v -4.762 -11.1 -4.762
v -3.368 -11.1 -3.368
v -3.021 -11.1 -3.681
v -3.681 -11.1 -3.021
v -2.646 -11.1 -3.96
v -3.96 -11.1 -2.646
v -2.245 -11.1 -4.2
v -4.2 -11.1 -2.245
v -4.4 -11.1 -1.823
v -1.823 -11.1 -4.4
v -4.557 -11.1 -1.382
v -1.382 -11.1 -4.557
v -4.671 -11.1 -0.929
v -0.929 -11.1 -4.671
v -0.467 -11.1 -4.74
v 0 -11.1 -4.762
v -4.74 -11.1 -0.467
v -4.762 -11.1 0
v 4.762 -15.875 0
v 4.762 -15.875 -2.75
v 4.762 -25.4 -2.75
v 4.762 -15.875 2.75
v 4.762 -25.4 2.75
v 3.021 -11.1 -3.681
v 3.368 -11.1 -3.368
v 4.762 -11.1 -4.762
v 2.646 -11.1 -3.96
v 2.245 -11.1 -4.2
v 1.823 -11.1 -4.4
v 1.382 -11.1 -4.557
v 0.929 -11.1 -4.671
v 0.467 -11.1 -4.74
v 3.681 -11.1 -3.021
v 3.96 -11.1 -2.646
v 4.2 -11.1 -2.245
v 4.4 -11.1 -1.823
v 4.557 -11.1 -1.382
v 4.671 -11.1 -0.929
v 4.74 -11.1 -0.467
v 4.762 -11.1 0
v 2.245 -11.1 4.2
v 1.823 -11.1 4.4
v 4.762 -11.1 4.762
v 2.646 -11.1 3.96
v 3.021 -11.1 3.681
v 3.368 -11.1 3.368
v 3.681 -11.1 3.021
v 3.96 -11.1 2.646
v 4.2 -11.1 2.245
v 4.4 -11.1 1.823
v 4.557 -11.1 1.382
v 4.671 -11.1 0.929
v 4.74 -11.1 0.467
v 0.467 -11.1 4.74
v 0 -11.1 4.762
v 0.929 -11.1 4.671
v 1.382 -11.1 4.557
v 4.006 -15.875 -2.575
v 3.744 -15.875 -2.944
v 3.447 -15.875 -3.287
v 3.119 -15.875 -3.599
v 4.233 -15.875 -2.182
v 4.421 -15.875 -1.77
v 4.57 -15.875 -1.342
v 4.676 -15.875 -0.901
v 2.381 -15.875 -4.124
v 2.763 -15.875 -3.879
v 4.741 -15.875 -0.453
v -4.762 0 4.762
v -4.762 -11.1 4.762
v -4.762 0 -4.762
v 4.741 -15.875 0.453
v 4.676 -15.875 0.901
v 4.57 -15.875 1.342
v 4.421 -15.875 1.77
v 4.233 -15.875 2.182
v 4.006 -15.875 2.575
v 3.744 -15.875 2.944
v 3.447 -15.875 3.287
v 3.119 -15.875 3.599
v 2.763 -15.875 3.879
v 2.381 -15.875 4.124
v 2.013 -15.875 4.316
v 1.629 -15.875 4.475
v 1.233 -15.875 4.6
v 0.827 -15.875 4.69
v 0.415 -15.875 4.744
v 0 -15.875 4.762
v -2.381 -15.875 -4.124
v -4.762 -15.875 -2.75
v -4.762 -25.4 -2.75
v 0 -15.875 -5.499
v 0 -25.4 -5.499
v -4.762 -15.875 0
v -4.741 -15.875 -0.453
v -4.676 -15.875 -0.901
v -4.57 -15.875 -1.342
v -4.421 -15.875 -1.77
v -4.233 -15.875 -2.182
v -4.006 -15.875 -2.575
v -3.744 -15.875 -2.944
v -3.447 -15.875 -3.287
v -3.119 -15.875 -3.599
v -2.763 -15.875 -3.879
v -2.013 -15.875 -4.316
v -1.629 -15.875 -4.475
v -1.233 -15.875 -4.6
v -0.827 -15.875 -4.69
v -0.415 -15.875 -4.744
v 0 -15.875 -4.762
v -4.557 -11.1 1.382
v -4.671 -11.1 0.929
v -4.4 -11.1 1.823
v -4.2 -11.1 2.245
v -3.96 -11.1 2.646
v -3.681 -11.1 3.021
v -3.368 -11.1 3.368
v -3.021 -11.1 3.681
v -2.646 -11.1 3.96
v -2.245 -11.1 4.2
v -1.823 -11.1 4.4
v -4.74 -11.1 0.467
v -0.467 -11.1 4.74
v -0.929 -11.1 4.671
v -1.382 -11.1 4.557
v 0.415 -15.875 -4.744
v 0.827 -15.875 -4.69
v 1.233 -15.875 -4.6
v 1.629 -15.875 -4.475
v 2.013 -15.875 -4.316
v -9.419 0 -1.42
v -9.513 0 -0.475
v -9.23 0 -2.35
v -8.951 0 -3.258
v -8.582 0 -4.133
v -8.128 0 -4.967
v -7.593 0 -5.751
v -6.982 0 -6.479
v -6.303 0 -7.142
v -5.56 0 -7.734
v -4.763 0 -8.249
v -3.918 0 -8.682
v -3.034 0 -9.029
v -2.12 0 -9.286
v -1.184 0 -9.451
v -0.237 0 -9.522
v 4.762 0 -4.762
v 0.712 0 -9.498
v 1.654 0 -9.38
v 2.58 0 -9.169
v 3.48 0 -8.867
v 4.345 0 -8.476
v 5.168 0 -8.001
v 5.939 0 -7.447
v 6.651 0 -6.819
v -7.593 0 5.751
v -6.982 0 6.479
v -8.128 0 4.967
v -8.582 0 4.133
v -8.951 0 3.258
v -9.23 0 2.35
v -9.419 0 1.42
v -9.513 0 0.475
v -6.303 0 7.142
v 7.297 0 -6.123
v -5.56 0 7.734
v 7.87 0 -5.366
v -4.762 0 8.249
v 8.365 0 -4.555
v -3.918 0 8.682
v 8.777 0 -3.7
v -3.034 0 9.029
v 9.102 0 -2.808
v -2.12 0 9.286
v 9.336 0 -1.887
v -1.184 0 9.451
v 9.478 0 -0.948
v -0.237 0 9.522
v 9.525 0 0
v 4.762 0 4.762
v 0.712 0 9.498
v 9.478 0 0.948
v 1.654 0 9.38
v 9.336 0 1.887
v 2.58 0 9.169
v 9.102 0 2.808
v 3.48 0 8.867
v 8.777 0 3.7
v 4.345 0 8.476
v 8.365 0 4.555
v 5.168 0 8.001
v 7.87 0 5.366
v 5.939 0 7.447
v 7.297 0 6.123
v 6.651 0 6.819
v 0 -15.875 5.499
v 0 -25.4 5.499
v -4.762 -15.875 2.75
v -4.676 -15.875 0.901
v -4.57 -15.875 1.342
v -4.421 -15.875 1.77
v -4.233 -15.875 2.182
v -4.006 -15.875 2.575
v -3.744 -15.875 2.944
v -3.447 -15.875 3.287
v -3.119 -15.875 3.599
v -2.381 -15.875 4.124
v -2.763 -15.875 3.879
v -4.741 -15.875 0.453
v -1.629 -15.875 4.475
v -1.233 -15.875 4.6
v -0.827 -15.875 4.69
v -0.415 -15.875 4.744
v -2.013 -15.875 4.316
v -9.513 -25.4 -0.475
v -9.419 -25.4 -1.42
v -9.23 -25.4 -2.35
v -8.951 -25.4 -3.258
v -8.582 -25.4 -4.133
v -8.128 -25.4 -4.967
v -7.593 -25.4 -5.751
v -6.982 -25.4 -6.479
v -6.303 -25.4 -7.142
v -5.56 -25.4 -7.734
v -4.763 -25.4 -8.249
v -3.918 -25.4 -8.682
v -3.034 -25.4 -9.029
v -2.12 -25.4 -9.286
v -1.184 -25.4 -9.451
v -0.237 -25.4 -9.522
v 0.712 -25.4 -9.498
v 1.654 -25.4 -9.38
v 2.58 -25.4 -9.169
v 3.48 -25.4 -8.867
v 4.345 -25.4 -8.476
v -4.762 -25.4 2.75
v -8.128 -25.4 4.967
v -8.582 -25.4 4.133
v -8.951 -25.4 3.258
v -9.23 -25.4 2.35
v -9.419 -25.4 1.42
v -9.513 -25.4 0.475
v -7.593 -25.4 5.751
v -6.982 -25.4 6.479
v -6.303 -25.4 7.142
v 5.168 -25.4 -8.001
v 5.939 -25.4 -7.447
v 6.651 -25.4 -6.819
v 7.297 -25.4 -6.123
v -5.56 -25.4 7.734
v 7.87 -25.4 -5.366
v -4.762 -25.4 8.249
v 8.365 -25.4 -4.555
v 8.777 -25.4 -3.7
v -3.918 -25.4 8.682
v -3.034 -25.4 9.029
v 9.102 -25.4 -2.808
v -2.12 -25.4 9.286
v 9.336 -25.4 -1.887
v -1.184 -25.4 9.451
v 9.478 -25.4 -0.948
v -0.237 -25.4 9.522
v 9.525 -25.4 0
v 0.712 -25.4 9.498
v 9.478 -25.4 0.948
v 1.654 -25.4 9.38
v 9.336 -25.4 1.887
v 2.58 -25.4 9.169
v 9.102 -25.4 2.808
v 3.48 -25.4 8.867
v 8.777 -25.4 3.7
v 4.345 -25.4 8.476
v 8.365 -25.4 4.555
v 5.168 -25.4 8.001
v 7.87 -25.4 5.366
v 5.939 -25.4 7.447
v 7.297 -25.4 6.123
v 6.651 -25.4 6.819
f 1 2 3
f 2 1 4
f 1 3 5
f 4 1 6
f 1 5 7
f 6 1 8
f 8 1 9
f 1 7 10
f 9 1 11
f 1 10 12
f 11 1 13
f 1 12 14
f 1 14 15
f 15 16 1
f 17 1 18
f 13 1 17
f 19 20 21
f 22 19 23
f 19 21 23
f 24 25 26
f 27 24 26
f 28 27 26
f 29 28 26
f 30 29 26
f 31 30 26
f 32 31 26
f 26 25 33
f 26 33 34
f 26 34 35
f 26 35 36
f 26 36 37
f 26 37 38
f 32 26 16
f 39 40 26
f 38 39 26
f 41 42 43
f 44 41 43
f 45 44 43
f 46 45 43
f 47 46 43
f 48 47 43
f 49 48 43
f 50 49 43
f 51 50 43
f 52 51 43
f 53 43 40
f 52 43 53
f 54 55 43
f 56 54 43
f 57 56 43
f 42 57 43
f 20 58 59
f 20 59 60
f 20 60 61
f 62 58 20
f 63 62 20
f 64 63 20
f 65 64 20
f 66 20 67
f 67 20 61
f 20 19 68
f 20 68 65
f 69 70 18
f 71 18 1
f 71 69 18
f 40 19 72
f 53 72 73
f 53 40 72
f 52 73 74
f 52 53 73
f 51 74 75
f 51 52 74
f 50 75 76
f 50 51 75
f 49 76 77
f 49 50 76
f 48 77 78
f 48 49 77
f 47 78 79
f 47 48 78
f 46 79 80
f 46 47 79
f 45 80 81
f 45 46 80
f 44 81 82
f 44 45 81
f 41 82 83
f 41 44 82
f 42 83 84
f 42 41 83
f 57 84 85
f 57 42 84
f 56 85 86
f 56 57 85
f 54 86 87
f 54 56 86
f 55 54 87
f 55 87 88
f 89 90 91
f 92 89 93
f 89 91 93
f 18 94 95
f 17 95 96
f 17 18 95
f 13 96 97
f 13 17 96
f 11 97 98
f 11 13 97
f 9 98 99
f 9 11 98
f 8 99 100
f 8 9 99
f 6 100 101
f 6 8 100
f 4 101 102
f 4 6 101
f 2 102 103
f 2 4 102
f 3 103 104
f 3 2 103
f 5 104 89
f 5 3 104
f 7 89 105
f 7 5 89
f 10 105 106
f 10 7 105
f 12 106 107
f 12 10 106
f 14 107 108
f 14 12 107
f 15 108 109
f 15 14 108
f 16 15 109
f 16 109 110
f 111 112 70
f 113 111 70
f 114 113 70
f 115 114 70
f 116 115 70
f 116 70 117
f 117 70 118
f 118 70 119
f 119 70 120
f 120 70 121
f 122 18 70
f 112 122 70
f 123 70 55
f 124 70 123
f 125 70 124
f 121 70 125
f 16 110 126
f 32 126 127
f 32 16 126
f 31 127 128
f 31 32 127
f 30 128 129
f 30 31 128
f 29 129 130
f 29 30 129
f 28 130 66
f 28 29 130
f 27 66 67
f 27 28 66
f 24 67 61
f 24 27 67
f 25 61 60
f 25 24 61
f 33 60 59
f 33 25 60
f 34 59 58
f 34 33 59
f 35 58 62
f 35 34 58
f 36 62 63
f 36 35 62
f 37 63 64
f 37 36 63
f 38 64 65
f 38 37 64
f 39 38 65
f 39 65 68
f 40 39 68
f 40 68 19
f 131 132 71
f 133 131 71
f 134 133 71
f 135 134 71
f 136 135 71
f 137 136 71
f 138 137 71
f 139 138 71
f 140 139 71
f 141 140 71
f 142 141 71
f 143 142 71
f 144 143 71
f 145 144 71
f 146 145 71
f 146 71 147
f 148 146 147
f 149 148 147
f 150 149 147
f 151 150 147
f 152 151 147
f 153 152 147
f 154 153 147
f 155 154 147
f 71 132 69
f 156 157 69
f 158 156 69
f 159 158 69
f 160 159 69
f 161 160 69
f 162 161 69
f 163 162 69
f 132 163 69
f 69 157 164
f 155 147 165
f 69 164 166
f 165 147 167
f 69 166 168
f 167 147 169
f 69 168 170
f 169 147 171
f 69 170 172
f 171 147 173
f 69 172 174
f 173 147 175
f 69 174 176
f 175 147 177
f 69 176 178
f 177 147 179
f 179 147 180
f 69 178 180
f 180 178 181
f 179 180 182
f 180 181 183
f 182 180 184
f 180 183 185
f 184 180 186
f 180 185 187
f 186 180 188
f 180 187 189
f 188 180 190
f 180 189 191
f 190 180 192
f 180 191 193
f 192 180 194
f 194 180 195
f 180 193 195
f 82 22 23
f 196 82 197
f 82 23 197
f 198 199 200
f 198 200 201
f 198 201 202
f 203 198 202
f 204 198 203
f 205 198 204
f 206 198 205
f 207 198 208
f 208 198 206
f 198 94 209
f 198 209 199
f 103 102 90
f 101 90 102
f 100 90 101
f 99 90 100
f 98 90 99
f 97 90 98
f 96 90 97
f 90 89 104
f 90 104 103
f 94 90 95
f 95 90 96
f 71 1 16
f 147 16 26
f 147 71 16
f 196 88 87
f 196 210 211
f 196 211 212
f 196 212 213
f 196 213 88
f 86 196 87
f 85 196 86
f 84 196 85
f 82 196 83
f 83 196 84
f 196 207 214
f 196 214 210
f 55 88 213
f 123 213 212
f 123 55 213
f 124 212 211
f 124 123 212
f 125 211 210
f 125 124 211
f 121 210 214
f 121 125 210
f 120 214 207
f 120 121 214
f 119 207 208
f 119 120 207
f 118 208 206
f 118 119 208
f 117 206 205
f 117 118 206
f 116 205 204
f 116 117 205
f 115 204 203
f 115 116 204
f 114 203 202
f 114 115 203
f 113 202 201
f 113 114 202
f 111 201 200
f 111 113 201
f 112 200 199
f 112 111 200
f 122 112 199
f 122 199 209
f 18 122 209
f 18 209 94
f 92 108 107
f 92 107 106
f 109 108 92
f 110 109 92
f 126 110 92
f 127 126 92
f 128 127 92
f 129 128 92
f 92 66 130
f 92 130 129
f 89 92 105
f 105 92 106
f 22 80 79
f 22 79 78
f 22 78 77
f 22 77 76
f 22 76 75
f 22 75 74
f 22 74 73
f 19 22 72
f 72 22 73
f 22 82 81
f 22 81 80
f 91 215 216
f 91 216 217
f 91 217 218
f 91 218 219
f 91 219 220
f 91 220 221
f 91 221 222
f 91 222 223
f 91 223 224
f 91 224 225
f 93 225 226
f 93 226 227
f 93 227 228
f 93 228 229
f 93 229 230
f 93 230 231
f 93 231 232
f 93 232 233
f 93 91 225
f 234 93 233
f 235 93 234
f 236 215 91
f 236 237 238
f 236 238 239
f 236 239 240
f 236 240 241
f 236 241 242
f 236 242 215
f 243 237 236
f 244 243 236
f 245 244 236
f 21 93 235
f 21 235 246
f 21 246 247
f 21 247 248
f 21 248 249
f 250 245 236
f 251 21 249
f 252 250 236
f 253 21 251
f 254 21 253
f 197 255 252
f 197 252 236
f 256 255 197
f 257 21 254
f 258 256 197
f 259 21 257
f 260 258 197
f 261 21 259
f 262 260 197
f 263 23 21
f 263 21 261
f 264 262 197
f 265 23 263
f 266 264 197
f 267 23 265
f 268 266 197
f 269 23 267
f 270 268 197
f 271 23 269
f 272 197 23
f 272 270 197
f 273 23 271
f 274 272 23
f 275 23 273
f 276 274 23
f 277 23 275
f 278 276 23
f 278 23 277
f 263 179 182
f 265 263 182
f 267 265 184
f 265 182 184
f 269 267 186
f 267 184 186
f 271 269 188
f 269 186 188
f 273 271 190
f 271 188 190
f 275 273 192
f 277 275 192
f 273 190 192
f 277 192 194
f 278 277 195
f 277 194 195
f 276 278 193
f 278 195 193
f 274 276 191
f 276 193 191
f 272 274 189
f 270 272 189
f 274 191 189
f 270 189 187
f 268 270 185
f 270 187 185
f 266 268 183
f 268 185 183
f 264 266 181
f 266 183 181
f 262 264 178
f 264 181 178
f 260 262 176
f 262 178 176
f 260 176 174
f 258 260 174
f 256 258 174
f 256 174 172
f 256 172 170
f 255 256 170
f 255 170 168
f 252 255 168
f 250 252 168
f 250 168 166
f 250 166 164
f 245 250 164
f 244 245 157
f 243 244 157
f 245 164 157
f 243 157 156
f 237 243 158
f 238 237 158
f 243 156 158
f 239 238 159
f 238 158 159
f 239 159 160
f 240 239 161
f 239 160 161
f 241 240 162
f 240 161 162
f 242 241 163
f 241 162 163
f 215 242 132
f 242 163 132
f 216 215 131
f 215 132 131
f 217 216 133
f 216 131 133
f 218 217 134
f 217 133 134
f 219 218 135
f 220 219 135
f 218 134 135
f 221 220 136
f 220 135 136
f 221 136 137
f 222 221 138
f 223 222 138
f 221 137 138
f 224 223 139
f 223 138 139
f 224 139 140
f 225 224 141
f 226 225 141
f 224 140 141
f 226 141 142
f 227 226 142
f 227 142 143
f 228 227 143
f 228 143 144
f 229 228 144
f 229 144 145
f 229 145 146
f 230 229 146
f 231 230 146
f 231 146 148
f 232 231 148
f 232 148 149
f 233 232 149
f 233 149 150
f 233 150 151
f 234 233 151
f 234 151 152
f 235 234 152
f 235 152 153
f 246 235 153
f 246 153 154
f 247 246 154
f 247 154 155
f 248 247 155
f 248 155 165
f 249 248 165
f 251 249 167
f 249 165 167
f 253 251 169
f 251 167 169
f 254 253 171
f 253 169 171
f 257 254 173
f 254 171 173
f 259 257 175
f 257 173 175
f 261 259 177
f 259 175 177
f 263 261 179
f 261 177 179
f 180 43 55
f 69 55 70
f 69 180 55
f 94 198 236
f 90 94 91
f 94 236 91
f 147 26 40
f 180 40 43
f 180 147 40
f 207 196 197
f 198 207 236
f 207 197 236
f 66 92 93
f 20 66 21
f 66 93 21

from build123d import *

# Parameters (mm, degrees)
F0_R     = 9.525
F1_DEPTH = 25.4
F3_DEPTH = 25.401
F4_DEPTH = 11.0998
F6_DEPTH = 9.525


with BuildPart() as f1:
    # F0 (on Front) → F1 (new body)
    with BuildSketch(Plane.XZ):
        Circle(F0_R)
    extrude(amount=F1_DEPTH)

    # F2 (on Front) → F3 (cut, through all)
    with BuildSketch(Plane.XZ):
        with BuildLine():
            ThreePointArc((-4.7625, 0), (-3.367596, -3.367596), (0, -4.7625))
            ThreePointArc((0, -4.7625), (3.367596, -3.367596), (4.7625, 0))
            ThreePointArc((4.7625, 0), (3.367596, 3.367596), (0, 4.7625))
            ThreePointArc((0, 4.7625), (-3.367596, 3.367596), (-4.7625, 0))
        make_face()
    extrude(amount=F3_DEPTH, mode=Mode.SUBTRACT)

    # F2 (on Front) → F4 (cut)
    with BuildSketch(Plane.XZ):
        with BuildLine():
            Line((0, -4.7625), (4.7625, -4.7625))
            Line((4.7625, -4.7625), (4.7625, 0))
            ThreePointArc((4.7625, 0), (3.367596, -3.367596), (0, -4.7625))
        make_face()
        with BuildLine():
            Line((-4.7625, -4.7625), (0, -4.7625))
            ThreePointArc((0, -4.7625), (-3.367596, -3.367596), (-4.7625, 0))
            Line((-4.7625, 0), (-4.7625, -4.7625))
        make_face()
        with BuildLine():
            ThreePointArc((0, 4.7625), (3.367596, 3.367596), (4.7625, 0))
            Line((4.7625, 0), (4.7625, 4.7625))
            Line((4.7625, 4.7625), (0, 4.7625))
        make_face()
        with BuildLine():
            Line((-4.7625, 4.7625), (-4.7625, 0))
            ThreePointArc((-4.7625, 0), (-3.367596, 3.367596), (0, 4.7625))
            Line((0, 4.7625), (-4.7625, 4.7625))
        make_face()
    extrude(amount=F4_DEPTH, mode=Mode.SUBTRACT)

    # F5 (on face) → F6 (cut)
    with BuildSketch(Plane.XZ.offset(25.4)):
        Polygon((4.7625, -2.749631), (4.7625, 2.749631), (0, 5.499261), (-4.7625, 2.749631), (-4.7625, -2.749631), (0, -5.499261), align=None)
    extrude(amount=-F6_DEPTH, mode=Mode.SUBTRACT)


solid = f1.part
